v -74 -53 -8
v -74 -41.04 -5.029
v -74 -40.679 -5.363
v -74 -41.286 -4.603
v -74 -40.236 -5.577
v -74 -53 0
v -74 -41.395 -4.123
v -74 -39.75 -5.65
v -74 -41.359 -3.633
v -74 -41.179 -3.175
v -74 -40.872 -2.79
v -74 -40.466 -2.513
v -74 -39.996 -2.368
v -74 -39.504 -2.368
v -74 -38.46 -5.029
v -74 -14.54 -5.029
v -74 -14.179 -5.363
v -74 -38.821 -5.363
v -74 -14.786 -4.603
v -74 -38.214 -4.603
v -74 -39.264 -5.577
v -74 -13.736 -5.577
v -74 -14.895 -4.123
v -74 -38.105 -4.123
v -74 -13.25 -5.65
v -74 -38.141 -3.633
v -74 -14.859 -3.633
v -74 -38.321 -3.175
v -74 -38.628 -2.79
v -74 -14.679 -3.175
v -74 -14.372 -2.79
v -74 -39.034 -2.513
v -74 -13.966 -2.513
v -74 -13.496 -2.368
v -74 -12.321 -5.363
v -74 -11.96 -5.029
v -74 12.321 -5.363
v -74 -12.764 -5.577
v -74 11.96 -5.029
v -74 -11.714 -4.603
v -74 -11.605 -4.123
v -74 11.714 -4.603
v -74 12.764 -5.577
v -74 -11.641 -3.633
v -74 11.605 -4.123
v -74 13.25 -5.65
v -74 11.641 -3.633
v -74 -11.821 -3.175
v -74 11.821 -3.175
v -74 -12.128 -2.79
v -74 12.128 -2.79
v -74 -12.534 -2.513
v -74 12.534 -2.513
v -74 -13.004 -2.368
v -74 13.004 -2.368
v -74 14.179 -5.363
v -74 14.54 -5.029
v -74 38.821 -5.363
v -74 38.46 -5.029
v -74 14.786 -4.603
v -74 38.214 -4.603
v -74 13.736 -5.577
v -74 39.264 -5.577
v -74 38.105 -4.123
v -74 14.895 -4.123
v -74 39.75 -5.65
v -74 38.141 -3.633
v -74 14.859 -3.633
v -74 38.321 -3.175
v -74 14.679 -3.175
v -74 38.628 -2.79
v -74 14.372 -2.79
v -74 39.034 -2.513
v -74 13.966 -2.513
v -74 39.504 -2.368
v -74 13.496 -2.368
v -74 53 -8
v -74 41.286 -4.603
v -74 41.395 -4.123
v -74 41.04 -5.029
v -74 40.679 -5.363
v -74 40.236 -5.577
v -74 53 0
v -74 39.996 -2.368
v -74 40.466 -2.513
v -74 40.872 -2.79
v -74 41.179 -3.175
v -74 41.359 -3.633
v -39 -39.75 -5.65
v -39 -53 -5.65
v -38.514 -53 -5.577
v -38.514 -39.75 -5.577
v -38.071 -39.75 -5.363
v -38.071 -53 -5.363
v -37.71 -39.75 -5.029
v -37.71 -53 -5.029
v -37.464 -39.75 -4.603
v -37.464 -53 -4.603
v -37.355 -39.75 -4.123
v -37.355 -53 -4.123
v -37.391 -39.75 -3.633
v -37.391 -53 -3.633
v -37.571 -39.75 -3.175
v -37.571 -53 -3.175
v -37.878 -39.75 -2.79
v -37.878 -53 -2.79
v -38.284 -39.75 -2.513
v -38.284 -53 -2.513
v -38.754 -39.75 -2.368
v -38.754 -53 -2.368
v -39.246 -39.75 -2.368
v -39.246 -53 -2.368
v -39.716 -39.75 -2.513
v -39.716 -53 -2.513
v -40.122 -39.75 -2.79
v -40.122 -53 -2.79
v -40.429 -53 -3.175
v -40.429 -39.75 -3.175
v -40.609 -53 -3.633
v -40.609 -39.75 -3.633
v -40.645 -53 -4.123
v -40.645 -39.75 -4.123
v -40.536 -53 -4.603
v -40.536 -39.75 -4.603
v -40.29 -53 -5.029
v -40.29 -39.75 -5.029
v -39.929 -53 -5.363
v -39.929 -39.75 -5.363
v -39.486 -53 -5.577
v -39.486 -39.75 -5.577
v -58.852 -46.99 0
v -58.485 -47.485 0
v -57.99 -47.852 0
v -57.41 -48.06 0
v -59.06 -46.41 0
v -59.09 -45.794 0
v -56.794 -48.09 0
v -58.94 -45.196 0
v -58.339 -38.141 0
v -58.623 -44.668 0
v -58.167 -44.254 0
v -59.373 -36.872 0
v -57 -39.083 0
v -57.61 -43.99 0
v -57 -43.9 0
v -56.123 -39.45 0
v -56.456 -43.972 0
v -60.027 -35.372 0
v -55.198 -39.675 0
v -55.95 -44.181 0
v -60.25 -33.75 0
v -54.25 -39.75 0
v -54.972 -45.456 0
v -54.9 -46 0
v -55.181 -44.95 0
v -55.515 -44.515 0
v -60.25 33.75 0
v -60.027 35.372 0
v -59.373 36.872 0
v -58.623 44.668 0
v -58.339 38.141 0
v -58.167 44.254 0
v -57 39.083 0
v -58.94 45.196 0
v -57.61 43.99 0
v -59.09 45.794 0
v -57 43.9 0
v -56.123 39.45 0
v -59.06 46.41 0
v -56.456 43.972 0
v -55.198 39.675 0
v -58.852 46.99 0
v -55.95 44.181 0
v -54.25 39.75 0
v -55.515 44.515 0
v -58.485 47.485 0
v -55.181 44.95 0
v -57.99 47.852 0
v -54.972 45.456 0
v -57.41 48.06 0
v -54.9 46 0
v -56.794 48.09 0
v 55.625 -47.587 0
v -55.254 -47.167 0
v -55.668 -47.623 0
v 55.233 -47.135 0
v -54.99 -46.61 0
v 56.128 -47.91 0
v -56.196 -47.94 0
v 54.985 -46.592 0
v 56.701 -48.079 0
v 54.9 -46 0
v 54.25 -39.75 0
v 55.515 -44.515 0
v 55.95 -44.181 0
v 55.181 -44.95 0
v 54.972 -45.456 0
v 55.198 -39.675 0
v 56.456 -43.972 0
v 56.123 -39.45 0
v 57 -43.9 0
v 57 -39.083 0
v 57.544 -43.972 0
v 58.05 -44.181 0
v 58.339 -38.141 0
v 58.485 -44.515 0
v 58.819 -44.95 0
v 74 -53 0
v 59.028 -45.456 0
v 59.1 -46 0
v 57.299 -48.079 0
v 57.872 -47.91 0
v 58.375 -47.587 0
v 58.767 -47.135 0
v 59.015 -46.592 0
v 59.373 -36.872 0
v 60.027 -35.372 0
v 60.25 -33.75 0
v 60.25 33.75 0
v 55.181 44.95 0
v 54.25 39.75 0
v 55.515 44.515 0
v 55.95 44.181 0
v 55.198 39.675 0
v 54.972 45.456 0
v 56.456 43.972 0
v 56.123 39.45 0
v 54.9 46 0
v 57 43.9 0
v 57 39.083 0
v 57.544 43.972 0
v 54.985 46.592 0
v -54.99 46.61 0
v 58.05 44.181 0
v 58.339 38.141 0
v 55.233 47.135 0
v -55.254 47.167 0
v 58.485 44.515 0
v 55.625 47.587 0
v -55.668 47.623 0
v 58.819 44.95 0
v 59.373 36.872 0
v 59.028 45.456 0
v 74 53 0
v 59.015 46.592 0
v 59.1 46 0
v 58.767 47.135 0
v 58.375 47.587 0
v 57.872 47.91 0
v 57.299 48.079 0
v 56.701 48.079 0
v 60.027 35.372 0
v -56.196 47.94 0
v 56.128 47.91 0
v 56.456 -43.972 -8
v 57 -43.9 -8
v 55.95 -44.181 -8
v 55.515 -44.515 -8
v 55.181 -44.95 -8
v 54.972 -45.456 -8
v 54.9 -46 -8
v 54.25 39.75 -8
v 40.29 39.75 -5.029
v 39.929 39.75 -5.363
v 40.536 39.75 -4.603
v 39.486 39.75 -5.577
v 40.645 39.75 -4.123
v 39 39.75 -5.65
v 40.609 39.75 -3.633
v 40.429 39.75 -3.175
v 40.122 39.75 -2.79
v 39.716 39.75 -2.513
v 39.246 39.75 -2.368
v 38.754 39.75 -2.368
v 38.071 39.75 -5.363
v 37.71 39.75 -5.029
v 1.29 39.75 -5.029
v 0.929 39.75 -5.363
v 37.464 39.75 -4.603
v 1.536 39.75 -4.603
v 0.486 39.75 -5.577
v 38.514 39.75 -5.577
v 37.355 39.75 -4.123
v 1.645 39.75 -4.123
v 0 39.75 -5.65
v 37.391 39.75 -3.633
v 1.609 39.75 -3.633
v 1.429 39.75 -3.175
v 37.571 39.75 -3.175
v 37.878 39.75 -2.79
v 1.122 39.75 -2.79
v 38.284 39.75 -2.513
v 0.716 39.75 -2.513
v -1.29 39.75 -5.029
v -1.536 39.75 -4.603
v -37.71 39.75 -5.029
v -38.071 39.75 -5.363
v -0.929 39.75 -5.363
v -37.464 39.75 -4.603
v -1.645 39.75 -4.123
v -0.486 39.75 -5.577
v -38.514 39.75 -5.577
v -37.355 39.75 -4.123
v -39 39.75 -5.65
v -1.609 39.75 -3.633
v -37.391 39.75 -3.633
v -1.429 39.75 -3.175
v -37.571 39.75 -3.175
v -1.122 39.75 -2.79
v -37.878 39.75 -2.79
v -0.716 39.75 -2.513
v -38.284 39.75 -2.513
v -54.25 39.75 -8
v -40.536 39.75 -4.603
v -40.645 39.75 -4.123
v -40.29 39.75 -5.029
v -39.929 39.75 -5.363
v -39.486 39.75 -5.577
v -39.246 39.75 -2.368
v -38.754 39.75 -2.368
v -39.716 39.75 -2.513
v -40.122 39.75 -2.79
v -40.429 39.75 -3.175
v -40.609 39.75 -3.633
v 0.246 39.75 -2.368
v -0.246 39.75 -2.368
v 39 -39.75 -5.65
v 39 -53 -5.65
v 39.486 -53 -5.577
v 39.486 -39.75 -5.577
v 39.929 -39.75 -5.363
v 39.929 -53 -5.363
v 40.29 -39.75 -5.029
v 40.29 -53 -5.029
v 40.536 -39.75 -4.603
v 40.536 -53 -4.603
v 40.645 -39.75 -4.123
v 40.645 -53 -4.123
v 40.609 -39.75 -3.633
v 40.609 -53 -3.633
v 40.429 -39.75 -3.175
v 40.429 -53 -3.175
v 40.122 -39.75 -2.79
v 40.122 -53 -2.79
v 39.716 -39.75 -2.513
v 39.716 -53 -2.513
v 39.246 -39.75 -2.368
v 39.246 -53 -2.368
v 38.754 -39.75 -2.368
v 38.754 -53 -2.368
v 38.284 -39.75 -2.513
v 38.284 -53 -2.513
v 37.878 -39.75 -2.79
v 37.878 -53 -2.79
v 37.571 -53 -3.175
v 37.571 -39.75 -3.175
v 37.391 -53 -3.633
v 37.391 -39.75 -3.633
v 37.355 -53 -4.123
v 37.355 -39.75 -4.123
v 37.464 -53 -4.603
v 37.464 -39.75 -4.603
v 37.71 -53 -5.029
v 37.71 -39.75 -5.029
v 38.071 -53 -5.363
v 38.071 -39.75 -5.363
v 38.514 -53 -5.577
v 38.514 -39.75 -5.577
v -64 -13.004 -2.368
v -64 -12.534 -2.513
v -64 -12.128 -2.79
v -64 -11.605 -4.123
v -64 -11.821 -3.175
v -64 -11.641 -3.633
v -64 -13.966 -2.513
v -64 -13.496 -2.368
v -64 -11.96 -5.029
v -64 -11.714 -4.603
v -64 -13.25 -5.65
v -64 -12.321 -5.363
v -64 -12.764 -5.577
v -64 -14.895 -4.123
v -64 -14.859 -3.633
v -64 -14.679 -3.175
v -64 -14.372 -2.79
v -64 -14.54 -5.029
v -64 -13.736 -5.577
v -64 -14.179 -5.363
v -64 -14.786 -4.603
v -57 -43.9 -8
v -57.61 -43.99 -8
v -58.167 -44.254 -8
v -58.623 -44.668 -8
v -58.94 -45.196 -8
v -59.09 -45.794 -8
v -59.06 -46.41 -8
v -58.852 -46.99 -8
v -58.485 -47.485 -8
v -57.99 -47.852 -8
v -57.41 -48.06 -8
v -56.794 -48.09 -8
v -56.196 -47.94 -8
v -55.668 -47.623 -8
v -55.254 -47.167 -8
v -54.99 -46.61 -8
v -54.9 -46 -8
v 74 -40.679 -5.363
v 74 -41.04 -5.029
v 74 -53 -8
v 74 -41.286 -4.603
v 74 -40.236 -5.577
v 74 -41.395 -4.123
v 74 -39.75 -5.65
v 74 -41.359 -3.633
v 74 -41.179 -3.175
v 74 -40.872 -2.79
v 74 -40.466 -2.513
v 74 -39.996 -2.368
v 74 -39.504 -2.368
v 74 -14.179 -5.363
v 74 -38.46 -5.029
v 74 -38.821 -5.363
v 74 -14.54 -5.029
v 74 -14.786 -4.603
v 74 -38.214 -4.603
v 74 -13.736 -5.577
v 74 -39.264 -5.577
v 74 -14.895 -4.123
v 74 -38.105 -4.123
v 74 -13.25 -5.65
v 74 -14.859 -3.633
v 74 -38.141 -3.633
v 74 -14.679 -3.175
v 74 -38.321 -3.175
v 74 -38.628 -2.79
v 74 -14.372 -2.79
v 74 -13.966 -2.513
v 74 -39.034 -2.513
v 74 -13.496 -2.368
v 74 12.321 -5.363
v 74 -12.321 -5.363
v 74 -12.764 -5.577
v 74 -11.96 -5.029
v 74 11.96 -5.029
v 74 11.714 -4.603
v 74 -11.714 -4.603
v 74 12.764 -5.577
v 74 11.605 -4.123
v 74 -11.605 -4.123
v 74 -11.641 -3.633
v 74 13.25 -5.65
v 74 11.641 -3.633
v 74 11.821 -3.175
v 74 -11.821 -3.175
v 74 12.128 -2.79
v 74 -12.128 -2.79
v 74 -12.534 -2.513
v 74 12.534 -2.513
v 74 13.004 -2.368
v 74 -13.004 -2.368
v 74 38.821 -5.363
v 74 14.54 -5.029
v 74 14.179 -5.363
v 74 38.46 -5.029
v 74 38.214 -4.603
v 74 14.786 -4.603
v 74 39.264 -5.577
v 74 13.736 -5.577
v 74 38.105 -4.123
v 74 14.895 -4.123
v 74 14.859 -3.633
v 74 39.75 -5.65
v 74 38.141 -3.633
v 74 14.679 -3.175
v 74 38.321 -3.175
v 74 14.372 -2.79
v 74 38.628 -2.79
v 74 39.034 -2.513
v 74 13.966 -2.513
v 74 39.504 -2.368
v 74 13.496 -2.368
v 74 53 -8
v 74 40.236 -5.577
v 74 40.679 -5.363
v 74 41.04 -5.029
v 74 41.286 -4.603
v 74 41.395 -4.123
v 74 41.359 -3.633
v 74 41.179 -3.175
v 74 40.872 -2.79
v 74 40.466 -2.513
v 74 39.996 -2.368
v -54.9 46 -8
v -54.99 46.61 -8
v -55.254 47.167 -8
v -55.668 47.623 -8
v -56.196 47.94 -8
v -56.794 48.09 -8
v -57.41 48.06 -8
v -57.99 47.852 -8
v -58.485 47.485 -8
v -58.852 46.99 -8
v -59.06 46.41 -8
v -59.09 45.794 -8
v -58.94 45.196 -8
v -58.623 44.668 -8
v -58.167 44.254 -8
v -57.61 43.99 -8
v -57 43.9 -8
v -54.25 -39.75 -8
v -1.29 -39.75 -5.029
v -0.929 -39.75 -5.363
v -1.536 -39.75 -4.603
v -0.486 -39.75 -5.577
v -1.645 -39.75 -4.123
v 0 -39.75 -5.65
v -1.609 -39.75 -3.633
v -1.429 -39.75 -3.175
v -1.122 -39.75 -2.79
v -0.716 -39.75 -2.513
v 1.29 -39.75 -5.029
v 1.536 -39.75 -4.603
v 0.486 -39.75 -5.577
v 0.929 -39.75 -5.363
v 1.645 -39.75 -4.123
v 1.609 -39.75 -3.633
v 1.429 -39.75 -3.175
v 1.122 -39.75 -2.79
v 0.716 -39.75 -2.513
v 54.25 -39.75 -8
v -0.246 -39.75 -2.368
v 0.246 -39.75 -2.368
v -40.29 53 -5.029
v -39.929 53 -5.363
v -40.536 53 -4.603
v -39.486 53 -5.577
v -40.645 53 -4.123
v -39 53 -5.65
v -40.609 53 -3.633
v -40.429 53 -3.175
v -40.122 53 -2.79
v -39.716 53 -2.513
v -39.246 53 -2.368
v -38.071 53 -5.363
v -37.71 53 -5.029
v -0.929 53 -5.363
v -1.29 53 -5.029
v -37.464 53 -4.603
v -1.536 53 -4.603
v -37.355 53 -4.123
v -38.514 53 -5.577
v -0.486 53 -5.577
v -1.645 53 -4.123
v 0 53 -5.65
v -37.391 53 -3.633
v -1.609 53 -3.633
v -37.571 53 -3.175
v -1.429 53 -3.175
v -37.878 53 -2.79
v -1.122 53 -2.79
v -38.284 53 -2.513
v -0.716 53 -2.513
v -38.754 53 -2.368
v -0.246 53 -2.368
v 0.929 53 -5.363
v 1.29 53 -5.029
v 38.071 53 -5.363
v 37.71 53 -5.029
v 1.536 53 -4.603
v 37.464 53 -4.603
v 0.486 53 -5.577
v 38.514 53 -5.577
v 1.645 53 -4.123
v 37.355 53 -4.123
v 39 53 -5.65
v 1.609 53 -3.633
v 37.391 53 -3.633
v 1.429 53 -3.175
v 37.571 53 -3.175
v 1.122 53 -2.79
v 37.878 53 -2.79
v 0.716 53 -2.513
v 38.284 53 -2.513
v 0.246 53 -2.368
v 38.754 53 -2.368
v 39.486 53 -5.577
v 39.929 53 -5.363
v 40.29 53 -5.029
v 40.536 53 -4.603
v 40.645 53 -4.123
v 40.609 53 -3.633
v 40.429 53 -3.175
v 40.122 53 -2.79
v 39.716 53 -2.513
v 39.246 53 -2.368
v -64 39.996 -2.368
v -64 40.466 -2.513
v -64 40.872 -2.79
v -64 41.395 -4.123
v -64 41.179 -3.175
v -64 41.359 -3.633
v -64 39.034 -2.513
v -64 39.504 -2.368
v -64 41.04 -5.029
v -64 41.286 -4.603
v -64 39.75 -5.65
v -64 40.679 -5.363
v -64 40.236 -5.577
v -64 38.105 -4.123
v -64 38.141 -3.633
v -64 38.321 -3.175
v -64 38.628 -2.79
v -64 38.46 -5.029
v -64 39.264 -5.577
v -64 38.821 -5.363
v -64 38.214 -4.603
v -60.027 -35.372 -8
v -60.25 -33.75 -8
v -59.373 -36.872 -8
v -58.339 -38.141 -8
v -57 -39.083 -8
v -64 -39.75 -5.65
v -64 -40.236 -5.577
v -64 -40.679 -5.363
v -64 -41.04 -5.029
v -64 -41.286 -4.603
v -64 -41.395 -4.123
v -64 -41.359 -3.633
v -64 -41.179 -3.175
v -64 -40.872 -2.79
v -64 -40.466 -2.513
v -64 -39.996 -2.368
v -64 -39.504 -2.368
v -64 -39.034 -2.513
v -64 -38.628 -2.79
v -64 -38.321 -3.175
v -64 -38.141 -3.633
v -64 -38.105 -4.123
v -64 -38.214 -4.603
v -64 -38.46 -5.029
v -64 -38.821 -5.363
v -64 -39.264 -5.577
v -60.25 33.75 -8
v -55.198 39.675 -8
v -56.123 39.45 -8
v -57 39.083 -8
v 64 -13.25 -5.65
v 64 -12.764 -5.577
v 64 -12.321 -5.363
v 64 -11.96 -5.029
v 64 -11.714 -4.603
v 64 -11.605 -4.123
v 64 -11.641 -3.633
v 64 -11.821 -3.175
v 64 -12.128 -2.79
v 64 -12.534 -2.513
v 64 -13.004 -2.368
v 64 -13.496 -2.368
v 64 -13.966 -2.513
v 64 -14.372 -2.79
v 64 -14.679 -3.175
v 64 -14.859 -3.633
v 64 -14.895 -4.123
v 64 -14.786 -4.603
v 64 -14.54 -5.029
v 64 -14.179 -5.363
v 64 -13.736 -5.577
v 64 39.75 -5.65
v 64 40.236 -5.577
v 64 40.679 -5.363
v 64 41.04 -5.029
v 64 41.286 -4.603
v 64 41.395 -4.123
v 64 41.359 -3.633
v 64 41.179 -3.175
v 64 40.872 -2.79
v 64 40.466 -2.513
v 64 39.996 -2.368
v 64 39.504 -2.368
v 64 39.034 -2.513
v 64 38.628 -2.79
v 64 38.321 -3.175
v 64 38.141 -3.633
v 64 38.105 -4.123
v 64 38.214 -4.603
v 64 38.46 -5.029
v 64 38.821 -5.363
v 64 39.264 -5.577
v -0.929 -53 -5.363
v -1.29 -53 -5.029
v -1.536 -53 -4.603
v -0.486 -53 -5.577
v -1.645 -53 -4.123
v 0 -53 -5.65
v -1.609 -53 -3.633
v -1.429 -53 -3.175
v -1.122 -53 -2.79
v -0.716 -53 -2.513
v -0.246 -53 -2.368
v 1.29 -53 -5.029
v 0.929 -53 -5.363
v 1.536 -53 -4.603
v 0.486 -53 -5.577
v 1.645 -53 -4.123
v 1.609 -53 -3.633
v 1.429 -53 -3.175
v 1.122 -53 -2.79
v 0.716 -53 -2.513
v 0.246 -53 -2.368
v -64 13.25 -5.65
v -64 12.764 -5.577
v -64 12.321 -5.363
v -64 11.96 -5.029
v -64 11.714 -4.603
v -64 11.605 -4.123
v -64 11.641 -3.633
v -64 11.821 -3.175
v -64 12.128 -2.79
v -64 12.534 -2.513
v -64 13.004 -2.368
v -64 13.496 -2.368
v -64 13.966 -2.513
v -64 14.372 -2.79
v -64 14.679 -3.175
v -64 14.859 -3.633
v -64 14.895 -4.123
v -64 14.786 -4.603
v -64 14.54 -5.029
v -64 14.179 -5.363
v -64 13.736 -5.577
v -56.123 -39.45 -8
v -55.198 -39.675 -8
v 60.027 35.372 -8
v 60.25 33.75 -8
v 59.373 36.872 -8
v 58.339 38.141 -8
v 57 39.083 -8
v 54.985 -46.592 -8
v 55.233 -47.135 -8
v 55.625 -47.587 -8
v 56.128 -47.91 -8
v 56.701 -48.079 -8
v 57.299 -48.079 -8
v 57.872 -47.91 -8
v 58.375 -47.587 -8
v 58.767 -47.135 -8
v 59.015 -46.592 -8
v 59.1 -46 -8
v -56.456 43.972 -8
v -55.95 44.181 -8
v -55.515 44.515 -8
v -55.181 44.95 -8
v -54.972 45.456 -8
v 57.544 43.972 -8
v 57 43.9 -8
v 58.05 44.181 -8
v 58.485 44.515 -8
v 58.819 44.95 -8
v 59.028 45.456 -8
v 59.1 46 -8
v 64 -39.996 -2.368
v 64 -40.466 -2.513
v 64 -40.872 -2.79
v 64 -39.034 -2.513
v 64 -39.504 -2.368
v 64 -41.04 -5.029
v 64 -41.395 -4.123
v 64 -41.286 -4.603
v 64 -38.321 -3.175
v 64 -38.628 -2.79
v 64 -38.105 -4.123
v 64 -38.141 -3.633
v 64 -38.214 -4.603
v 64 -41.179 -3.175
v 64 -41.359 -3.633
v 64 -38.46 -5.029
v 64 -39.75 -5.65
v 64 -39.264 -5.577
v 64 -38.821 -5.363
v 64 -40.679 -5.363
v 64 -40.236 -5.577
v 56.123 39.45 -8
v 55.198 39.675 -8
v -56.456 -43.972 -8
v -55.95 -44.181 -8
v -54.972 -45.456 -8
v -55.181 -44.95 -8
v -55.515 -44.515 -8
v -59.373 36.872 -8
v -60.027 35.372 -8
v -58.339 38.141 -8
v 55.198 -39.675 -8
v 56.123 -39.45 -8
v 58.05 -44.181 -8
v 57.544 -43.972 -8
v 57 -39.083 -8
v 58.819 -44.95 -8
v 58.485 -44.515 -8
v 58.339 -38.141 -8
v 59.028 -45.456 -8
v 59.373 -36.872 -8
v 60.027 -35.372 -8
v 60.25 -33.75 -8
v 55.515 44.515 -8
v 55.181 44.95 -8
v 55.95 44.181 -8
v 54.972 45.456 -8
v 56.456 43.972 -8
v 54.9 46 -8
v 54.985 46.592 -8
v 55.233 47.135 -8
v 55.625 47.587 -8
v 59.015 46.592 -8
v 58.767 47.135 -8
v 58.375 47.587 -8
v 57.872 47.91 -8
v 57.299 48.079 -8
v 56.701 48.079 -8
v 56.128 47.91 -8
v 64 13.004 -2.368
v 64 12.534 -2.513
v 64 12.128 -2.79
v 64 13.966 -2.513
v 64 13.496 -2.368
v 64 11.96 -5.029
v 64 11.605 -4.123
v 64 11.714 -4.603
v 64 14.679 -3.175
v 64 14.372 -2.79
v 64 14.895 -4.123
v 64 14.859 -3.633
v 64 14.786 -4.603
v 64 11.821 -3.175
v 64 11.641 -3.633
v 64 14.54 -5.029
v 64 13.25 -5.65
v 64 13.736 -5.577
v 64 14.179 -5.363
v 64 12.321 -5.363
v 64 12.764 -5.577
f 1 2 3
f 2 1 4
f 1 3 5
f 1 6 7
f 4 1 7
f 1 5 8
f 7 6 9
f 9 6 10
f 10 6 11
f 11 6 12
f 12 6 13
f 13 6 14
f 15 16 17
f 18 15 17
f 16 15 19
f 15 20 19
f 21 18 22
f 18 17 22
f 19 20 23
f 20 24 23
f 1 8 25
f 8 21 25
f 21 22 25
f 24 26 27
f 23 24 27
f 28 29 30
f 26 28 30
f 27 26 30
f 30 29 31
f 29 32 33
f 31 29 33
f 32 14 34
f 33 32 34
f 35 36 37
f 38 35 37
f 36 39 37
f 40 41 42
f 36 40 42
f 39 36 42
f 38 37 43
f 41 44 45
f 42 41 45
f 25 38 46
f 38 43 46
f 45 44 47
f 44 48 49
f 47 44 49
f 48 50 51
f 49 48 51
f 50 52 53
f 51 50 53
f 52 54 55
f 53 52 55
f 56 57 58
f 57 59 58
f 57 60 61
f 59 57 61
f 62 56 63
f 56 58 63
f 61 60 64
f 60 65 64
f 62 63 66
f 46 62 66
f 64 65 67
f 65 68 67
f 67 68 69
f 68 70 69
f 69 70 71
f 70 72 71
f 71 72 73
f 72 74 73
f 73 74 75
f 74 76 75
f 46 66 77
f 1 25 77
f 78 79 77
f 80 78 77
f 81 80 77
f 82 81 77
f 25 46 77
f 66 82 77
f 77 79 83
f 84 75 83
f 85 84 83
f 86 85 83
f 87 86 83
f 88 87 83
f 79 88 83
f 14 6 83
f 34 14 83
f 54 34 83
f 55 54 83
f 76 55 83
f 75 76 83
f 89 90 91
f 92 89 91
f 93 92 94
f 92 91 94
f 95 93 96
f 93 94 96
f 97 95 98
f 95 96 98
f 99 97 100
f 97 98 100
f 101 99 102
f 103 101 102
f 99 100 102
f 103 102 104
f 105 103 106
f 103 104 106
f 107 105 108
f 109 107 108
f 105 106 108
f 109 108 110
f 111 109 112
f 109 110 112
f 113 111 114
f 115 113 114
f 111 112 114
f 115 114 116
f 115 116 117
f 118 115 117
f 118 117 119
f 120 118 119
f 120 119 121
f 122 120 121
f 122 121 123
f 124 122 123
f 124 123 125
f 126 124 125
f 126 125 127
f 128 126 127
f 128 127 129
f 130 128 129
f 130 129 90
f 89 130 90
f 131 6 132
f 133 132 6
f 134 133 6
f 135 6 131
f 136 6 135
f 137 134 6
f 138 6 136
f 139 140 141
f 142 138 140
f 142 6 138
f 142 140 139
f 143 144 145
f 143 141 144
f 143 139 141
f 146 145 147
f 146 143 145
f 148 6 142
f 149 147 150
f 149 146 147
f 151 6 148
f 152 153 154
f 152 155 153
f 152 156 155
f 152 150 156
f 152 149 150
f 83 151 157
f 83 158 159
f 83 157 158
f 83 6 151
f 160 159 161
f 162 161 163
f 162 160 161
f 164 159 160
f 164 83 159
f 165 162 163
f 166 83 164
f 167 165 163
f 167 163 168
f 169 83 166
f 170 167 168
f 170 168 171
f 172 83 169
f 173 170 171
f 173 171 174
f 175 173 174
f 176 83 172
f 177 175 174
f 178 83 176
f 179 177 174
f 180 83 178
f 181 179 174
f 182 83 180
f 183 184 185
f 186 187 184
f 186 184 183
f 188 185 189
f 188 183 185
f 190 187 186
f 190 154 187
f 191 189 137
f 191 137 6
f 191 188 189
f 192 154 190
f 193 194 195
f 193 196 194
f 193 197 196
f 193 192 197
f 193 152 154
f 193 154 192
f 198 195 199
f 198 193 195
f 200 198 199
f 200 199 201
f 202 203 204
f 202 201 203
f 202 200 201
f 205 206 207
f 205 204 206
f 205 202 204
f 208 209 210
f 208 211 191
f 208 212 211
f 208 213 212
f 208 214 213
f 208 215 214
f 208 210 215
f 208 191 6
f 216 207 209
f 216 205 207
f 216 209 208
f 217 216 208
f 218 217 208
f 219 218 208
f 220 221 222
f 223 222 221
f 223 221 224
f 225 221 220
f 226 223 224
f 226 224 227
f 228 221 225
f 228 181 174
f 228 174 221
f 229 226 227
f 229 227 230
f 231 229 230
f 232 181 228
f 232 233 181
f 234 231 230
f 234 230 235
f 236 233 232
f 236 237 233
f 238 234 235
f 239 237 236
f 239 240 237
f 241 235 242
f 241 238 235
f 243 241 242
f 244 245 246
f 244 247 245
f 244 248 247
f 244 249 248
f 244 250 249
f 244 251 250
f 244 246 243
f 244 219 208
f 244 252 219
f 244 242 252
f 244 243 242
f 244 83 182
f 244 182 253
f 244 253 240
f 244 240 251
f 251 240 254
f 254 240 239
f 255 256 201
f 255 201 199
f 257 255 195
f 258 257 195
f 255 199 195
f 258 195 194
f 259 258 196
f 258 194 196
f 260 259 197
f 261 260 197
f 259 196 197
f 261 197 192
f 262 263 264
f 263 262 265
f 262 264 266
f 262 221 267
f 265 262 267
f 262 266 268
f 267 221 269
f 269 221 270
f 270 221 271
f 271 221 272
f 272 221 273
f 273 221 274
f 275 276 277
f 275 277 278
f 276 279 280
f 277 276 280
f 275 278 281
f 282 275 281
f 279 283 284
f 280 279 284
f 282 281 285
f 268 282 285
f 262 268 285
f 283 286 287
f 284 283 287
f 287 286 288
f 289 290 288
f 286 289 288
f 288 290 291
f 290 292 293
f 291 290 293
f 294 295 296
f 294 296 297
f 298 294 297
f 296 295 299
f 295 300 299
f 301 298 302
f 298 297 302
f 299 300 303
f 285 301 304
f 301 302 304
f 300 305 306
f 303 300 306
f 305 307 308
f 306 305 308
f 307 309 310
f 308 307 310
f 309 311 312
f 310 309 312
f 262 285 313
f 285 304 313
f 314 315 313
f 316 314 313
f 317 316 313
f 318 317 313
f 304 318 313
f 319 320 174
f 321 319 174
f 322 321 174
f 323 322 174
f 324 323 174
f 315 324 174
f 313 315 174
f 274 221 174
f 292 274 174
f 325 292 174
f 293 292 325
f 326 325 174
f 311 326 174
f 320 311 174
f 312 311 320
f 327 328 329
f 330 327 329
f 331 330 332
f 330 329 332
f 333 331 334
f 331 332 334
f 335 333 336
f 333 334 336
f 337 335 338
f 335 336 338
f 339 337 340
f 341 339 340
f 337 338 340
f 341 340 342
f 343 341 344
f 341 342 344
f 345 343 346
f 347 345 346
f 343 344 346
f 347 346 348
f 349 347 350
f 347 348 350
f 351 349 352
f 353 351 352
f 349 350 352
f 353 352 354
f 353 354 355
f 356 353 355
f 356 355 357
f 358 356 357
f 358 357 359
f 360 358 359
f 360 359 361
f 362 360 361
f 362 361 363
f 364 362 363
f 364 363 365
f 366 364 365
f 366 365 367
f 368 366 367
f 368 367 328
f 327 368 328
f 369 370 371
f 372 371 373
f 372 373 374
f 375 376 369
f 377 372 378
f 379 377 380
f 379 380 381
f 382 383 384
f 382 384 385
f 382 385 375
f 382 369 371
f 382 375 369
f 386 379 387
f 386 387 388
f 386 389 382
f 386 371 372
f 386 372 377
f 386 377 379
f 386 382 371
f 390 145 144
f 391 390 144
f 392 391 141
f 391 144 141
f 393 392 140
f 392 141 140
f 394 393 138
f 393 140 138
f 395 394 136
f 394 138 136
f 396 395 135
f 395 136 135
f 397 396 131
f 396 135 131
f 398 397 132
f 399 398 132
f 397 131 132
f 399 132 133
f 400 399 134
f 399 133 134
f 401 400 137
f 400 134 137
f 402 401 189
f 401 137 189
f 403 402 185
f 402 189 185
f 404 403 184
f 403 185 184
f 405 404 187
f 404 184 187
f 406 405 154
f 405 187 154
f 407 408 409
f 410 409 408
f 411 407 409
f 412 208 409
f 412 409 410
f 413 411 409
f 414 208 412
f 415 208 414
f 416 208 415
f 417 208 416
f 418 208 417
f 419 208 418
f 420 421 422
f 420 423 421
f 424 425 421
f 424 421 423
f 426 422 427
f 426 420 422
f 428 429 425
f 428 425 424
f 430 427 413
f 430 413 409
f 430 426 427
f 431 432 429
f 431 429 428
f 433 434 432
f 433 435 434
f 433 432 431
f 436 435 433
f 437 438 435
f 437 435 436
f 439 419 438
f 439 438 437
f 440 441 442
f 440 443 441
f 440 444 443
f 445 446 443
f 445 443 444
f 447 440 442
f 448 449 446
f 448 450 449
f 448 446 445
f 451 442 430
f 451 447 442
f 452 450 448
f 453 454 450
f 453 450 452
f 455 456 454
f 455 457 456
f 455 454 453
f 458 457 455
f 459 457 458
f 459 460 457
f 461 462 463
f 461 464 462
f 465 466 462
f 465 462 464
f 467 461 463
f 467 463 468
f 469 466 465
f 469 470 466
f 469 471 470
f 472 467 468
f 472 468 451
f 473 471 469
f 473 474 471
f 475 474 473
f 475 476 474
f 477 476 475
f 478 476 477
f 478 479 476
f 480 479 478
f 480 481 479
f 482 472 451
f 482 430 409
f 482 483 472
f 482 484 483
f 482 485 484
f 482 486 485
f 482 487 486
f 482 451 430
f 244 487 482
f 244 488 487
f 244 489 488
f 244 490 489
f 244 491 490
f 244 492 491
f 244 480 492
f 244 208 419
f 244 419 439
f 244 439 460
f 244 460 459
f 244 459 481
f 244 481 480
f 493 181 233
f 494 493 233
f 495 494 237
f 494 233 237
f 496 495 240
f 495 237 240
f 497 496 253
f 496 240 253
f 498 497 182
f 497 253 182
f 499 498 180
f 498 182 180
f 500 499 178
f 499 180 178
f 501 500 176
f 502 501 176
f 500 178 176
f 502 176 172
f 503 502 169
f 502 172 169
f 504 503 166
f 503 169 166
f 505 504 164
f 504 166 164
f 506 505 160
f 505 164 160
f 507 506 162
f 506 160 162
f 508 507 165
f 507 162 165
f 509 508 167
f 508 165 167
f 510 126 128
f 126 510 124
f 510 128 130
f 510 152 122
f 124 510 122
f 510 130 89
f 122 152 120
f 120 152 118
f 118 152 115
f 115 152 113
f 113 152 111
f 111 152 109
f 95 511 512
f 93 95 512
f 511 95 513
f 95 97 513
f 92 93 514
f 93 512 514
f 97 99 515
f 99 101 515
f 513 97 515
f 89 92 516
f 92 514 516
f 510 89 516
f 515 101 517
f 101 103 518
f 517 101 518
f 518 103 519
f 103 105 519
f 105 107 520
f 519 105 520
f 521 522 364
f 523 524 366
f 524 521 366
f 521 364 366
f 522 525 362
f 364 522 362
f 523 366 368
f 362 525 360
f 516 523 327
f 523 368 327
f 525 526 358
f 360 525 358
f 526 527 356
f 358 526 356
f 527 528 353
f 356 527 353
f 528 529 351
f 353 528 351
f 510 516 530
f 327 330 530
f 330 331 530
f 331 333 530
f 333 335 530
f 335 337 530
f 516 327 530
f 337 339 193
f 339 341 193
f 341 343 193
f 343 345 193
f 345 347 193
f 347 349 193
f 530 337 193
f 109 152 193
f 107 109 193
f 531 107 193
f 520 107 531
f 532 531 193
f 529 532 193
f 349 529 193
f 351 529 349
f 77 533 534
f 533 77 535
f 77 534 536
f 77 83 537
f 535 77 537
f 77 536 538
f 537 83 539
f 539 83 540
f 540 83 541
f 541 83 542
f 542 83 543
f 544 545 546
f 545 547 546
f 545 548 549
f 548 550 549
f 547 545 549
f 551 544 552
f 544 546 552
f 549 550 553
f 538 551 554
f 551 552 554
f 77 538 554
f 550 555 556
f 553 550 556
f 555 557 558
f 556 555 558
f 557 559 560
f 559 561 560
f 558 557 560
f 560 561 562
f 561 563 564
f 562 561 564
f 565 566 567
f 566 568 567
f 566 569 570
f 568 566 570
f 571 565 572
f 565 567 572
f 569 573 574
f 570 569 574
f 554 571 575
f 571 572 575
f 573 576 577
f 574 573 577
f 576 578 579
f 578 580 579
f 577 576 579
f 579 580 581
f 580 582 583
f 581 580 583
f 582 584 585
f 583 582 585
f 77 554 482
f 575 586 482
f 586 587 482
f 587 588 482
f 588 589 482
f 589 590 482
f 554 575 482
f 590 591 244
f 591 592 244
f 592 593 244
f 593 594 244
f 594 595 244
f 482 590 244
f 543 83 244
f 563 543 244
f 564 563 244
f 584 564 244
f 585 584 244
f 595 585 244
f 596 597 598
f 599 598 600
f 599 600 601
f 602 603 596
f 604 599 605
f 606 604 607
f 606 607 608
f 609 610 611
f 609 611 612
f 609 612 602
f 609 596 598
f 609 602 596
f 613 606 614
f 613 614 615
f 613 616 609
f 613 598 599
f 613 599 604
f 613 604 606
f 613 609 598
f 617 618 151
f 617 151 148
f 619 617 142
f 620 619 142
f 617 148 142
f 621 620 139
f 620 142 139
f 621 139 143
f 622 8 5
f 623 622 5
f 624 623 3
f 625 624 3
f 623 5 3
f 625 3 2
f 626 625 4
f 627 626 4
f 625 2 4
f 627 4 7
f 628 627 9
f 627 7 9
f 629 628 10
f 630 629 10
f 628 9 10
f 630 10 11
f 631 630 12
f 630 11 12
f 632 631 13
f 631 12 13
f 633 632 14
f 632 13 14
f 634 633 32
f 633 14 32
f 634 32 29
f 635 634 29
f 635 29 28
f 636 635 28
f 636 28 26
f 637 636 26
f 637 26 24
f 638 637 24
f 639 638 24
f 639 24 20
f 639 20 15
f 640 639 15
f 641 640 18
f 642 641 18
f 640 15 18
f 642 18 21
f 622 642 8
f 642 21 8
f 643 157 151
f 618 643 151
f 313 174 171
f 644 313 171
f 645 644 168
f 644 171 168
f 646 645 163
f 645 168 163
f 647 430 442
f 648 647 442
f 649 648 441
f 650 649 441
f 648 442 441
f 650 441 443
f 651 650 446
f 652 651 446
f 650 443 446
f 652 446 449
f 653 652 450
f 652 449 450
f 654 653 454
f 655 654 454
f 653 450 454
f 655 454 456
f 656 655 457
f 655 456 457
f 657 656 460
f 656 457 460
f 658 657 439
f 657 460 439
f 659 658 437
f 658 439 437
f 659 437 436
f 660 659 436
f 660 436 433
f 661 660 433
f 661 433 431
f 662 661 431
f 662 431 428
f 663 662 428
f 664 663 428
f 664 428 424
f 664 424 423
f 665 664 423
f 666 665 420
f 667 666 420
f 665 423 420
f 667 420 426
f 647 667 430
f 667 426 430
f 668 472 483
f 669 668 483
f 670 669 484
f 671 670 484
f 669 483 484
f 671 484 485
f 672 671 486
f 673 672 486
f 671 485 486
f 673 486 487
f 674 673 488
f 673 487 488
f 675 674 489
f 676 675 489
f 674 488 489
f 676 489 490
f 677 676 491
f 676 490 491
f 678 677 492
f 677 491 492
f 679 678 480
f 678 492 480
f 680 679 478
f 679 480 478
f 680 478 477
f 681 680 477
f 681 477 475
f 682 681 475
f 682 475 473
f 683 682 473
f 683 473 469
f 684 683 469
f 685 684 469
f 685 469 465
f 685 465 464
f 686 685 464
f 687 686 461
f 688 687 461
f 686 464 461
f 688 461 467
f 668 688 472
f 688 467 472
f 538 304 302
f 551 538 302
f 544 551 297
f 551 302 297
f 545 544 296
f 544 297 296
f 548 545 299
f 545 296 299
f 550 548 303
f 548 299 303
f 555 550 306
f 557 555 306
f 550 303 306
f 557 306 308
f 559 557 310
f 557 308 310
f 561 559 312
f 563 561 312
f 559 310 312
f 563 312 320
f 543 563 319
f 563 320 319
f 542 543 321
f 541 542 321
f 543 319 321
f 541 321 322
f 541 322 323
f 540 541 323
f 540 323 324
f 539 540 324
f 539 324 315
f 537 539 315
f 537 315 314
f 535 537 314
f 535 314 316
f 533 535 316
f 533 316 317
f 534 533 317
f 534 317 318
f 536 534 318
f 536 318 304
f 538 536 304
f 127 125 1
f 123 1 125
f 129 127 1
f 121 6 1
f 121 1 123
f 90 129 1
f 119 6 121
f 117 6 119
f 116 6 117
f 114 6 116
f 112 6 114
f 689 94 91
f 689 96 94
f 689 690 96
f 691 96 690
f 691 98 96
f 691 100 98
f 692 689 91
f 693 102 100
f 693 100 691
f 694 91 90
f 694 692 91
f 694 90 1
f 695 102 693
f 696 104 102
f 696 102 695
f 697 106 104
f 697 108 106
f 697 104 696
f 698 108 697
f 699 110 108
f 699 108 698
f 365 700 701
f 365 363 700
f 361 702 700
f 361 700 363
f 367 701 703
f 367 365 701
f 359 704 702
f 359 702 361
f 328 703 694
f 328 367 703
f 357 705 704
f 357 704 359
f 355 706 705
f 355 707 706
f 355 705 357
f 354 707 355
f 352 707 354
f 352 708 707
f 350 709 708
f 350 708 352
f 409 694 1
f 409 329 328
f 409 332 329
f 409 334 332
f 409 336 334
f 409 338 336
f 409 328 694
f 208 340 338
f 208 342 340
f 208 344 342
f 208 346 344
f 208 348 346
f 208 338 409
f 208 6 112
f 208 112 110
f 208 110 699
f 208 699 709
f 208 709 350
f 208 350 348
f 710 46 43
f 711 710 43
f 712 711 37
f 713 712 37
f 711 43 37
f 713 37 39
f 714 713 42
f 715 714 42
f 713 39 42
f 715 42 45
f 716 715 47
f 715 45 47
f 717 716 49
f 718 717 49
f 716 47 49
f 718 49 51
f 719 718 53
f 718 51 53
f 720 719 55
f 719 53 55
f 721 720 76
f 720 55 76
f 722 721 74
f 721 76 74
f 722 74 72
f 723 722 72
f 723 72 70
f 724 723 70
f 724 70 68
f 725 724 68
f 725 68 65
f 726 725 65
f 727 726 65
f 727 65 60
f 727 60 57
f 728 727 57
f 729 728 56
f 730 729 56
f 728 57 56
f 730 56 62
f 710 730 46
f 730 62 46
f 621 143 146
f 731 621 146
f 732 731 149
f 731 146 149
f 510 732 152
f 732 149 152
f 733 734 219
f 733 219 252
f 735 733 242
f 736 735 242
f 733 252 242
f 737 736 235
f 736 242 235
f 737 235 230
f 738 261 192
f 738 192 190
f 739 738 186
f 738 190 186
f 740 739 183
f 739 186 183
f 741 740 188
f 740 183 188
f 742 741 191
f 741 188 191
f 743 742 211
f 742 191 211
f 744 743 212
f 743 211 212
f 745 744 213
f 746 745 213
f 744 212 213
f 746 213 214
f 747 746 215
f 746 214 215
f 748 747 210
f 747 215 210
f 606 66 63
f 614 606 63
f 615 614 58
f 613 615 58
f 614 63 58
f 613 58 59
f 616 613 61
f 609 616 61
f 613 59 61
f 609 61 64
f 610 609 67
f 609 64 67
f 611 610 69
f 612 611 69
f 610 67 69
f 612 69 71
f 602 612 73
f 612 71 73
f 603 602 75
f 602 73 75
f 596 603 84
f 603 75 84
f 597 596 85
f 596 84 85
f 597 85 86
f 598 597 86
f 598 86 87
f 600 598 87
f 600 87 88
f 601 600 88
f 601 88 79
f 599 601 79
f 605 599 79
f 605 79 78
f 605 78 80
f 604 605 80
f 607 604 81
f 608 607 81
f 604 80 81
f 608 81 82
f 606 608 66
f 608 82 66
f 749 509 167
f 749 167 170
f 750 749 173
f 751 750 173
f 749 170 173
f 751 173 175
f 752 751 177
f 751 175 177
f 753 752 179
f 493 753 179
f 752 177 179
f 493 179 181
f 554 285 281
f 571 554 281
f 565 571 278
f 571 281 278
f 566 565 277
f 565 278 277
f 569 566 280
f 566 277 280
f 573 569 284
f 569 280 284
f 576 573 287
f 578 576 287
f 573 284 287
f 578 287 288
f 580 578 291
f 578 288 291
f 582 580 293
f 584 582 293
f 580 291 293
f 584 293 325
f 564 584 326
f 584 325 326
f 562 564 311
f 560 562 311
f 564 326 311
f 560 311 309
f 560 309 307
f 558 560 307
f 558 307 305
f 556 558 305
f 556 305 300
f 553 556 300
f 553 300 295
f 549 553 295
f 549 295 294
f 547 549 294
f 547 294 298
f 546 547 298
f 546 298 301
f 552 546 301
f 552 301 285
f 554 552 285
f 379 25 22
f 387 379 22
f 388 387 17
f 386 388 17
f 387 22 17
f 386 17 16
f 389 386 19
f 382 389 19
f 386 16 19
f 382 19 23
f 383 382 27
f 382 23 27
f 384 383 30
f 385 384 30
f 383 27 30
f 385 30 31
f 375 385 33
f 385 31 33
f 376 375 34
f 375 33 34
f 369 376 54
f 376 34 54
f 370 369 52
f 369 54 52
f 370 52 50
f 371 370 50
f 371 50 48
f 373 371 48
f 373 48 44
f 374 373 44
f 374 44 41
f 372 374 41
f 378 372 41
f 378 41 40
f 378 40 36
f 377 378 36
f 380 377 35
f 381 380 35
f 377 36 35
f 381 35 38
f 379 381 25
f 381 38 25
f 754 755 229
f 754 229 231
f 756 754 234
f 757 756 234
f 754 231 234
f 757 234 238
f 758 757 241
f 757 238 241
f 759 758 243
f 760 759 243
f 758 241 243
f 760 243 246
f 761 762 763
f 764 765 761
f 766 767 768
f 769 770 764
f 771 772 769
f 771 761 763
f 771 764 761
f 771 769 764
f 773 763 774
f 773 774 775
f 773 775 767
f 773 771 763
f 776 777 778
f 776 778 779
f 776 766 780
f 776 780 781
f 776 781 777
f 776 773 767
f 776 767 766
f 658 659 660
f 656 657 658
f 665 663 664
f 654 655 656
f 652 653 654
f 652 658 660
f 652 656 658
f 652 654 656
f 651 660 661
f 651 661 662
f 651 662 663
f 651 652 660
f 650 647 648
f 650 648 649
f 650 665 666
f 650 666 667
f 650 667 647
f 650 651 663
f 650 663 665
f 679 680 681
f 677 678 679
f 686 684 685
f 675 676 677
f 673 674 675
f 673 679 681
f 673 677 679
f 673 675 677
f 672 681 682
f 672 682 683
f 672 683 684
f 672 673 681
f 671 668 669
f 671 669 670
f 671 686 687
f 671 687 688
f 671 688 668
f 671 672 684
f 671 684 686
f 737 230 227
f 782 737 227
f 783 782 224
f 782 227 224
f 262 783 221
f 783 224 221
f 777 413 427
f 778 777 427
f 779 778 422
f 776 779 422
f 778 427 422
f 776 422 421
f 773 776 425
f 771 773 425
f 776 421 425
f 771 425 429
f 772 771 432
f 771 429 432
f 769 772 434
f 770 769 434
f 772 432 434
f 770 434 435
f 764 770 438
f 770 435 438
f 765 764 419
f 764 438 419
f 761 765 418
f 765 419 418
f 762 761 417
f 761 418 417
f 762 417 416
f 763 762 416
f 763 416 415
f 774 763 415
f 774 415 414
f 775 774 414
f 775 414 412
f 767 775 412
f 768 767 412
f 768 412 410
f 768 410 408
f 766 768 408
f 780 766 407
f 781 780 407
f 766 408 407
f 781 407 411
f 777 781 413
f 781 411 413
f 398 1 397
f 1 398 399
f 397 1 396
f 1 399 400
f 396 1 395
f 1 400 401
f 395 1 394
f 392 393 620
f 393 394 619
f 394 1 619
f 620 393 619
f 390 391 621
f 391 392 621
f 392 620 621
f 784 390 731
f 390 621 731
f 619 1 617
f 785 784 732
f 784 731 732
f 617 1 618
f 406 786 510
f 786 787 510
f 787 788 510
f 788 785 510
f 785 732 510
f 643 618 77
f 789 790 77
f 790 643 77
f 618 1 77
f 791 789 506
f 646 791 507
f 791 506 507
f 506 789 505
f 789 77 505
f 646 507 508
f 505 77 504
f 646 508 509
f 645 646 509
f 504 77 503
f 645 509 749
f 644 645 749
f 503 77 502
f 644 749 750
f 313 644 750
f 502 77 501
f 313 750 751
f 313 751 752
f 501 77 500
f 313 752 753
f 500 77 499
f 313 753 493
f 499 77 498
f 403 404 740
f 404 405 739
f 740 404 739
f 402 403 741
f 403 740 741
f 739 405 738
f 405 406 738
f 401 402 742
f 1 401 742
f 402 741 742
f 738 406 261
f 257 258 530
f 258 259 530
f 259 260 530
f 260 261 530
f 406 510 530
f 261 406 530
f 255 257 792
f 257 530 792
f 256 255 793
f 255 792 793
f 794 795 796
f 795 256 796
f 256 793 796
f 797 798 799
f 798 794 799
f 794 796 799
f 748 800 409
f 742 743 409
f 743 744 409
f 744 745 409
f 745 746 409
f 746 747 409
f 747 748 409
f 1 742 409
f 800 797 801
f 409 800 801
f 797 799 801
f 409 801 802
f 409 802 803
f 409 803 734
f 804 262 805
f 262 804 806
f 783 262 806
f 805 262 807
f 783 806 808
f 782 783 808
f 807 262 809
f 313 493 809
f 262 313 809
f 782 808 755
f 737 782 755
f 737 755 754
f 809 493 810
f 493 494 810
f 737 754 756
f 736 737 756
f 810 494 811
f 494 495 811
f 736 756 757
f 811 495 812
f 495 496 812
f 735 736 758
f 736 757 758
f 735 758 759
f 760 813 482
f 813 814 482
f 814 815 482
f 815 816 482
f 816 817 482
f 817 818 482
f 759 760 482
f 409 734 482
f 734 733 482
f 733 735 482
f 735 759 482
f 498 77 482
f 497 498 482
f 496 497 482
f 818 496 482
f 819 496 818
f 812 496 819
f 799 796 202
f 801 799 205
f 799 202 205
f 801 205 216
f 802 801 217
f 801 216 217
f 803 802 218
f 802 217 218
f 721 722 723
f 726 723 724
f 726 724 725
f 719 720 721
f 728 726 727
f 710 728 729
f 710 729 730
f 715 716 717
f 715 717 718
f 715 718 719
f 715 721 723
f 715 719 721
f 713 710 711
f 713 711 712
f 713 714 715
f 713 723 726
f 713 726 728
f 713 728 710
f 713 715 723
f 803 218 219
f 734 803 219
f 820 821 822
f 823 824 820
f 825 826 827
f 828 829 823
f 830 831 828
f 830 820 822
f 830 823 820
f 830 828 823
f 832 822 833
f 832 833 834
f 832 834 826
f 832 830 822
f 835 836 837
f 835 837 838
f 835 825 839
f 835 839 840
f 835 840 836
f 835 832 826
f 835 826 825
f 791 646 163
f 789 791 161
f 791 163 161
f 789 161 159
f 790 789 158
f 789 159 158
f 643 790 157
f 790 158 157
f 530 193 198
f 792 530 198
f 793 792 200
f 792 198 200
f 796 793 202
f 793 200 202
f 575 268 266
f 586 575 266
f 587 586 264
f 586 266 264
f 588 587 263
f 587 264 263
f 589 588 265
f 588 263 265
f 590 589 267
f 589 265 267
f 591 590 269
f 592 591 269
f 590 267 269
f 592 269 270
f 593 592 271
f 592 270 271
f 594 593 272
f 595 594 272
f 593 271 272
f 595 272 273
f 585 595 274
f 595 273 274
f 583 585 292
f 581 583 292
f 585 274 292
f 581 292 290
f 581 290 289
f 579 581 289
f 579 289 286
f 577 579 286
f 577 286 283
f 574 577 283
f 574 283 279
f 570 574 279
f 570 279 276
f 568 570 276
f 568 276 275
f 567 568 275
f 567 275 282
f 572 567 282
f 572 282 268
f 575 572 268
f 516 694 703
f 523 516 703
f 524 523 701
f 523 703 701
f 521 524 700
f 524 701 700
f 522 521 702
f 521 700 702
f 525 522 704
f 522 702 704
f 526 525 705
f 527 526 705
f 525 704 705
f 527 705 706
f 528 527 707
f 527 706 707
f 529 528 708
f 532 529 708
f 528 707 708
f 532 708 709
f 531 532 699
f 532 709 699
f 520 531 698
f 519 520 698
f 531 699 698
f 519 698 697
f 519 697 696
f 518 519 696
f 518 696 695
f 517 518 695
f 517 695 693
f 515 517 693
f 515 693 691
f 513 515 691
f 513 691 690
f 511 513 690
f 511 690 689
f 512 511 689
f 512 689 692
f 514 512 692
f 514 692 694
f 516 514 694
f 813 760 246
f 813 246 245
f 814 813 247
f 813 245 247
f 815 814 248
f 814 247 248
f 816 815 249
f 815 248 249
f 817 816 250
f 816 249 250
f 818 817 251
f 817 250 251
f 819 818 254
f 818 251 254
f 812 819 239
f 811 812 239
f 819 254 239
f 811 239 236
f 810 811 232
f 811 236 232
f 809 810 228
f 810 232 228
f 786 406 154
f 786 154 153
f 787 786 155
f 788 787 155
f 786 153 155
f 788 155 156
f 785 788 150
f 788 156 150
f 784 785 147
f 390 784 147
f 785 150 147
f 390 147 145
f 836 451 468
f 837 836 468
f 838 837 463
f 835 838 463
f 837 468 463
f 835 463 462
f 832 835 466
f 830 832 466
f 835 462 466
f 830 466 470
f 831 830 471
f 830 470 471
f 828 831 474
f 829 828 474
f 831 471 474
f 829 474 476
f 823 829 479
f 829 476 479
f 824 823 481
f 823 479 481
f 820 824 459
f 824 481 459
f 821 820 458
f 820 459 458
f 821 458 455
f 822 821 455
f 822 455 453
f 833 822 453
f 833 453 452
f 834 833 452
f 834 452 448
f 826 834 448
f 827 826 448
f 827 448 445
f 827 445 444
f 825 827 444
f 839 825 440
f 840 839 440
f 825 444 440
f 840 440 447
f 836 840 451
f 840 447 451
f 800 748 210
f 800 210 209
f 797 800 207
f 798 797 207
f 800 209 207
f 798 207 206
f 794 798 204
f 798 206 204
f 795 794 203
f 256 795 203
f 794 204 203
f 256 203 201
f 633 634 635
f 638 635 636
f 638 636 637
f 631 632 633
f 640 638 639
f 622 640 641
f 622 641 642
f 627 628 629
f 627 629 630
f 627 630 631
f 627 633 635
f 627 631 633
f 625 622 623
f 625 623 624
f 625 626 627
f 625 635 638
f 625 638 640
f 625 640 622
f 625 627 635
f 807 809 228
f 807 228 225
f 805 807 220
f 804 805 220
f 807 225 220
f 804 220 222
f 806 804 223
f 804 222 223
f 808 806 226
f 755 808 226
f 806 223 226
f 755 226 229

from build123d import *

# Parameters (mm, degrees)
SKETCH1_W           = 148
SKETCH1_H           = 106
BOSS_EXTRUDE1_DEPTH = 8
CUT_EXTRUDE1_REACH  = 93.373
SKETCH3_R           = 1.65
CUT_EXTRUDE2_DEPTH  = 130.52219887
SKETCH5_R           = 1.65
CUT_EXTRUDE3_DEPTH  = 10
SKETCH6_R           = 1.65
CUT_EXTRUDE4_DEPTH  = 10


with BuildPart() as part:
    # Sketch1 → Boss-Extrude1 (new body)
    with BuildSketch(Plane.XY):
        Rectangle(SKETCH1_W, SKETCH1_H)
    extrude(amount=-BOSS_EXTRUDE1_DEPTH)

    # Sketch2 → Cut-Extrude1 (cut, up to next)
    with BuildSketch(Plane.XY, mode=Mode.PRIVATE) as cut_extrude1_sk1:
        with BuildLine():
            ThreePointArc((60.25, 33.75), (59.373475383, 36.872498999), (57, 39.082682252))
            Line((57, 39.082682252), (57, -39.082682252))
            ThreePointArc((57, -39.082682252), (59.373475383, -36.872498999), (60.25, -33.75))
            Line((60.25, -33.75), (60.25, 33.75))
        make_face()
    cut_extrude1_tool1 = extrude(cut_extrude1_sk1.sketch, amount=-CUT_EXTRUDE1_REACH, mode=Mode.PRIVATE) & part.part
    # Sketch2 → Cut-Extrude1 (cut, up to next)
    with BuildSketch(Plane.XY, mode=Mode.PRIVATE) as cut_extrude1_sk2:
        with BuildLine():
            ThreePointArc((-54.25, 39.75), (-55.66490397, 39.580784403), (-57, 39.082682252))
            Line((-57, 39.082682252), (-57, -39.082682252))
            ThreePointArc((-57, -39.082682252), (-55.66490397, -39.580784403), (-54.25, -39.75))
            Line((-54.25, -39.75), (54.25, -39.75))
            ThreePointArc((54.25, -39.75), (55.66490397, -39.580784403), (57, -39.082682252))
            Line((57, -39.082682252), (57, 39.082682252))
            ThreePointArc((57, 39.082682252), (55.66490397, 39.580784403), (54.25, 39.75))
            Line((54.25, 39.75), (-54.25, 39.75))
        make_face()
    cut_extrude1_tool2 = extrude(cut_extrude1_sk2.sketch, amount=-CUT_EXTRUDE1_REACH, mode=Mode.PRIVATE) & part.part
    # Sketch2 → Cut-Extrude1 (cut, up to next)
    with BuildSketch(Plane.XY, mode=Mode.PRIVATE) as cut_extrude1_sk3:
        with BuildLine():
            Line((-57, -39.082682252), (-57, 39.082682252))
            ThreePointArc((-57, 39.082682252), (-59.373475383, 36.872498999), (-60.25, 33.75))
            Line((-60.25, 33.75), (-60.25, -33.75))
            ThreePointArc((-60.25, -33.75), (-59.373475383, -36.872498999), (-57, -39.082682252))
        make_face()
    cut_extrude1_tool3 = extrude(cut_extrude1_sk3.sketch, amount=-CUT_EXTRUDE1_REACH, mode=Mode.PRIVATE) & part.part
    # Sketch2 → Cut-Extrude1 (cut, up to next)
    with BuildSketch(Plane.XY, mode=Mode.PRIVATE) as cut_extrude1_sk4:
        with BuildLine():
            ThreePointArc((59.1, 46), (57, 48.1), (54.9, 46))
            Line((54.9, 46), (57, 46))
            Line((57, 46), (57, 43.9))
            ThreePointArc((57, 43.9), (58.48492424, 44.51507576), (59.1, 46))
        make_face()
    cut_extrude1_tool4 = extrude(cut_extrude1_sk4.sketch, amount=-CUT_EXTRUDE1_REACH, mode=Mode.PRIVATE) & part.part
    # Sketch2 → Cut-Extrude1 (cut, up to next)
    with BuildSketch(Plane.XY, mode=Mode.PRIVATE) as cut_extrude1_sk5:
        with BuildLine():
            Line((57, 46), (54.9, 46))
            ThreePointArc((54.9, 46), (55.51507576, 44.51507576), (57, 43.9))
            Line((57, 43.9), (57, 46))
        make_face()
    cut_extrude1_tool5 = extrude(cut_extrude1_sk5.sketch, amount=-CUT_EXTRUDE1_REACH, mode=Mode.PRIVATE) & part.part
    # Sketch2 → Cut-Extrude1 (cut, up to next)
    with BuildSketch(Plane.XY, mode=Mode.PRIVATE) as cut_extrude1_sk6:
        with BuildLine():
            ThreePointArc((59.1, 46), (57, 48.1), (54.9, 46))
            Line((54.9, 46), (57, 46))
            Line((57, 46), (57, 43.9))
            ThreePointArc((57, 43.9), (58.48492424, 44.51507576), (59.1, 46))
        make_face()
    cut_extrude1_tool6 = extrude(cut_extrude1_sk6.sketch, amount=-CUT_EXTRUDE1_REACH, mode=Mode.PRIVATE) & part.part
    # Sketch2 → Cut-Extrude1 (cut, up to next)
    with BuildSketch(Plane.XY, mode=Mode.PRIVATE) as cut_extrude1_sk7:
        with BuildLine():
            Line((57, 46), (54.9, 46))
            ThreePointArc((54.9, 46), (55.51507576, 44.51507576), (57, 43.9))
            Line((57, 43.9), (57, 46))
        make_face()
    cut_extrude1_tool7 = extrude(cut_extrude1_sk7.sketch, amount=-CUT_EXTRUDE1_REACH, mode=Mode.PRIVATE) & part.part
    # Sketch2 → Cut-Extrude1 (cut, up to next)
    with BuildSketch(Plane.XY, mode=Mode.PRIVATE) as cut_extrude1_sk8:
        with BuildLine():
            Line((-57, 43.9), (-57, 46))
            Line((-57, 46), (-54.9, 46))
            ThreePointArc((-54.9, 46), (-58.48492424, 47.48492424), (-57, 43.9))
        make_face()
    cut_extrude1_tool8 = extrude(cut_extrude1_sk8.sketch, amount=-CUT_EXTRUDE1_REACH, mode=Mode.PRIVATE) & part.part
    # Sketch2 → Cut-Extrude1 (cut, up to next)
    with BuildSketch(Plane.XY, mode=Mode.PRIVATE) as cut_extrude1_sk9:
        with BuildLine():
            Line((-54.9, 46), (-57, 46))
            Line((-57, 46), (-57, 43.9))
            ThreePointArc((-57, 43.9), (-55.51507576, 44.51507576), (-54.9, 46))
        make_face()
    cut_extrude1_tool9 = extrude(cut_extrude1_sk9.sketch, amount=-CUT_EXTRUDE1_REACH, mode=Mode.PRIVATE) & part.part
    # Sketch2 → Cut-Extrude1 (cut, up to next)
    with BuildSketch(Plane.XY, mode=Mode.PRIVATE) as cut_extrude1_sk10:
        with BuildLine():
            Line((-57, 43.9), (-57, 46))
            Line((-57, 46), (-54.9, 46))
            ThreePointArc((-54.9, 46), (-58.48492424, 47.48492424), (-57, 43.9))
        make_face()
    cut_extrude1_tool10 = extrude(cut_extrude1_sk10.sketch, amount=-CUT_EXTRUDE1_REACH, mode=Mode.PRIVATE) & part.part
    # Sketch2 → Cut-Extrude1 (cut, up to next)
    with BuildSketch(Plane.XY, mode=Mode.PRIVATE) as cut_extrude1_sk11:
        with BuildLine():
            Line((-54.9, 46), (-57, 46))
            Line((-57, 46), (-57, 43.9))
            ThreePointArc((-57, 43.9), (-55.51507576, 44.51507576), (-54.9, 46))
        make_face()
    cut_extrude1_tool11 = extrude(cut_extrude1_sk11.sketch, amount=-CUT_EXTRUDE1_REACH, mode=Mode.PRIVATE) & part.part
    # Sketch2 → Cut-Extrude1 (cut, up to next)
    with BuildSketch(Plane.XY, mode=Mode.PRIVATE) as cut_extrude1_sk12:
        with BuildLine():
            ThreePointArc((-54.9, -46), (-55.51507576, -44.51507576), (-57, -43.9))
            Line((-57, -43.9), (-57, -46))
            Line((-57, -46), (-54.9, -46))
        make_face()
    cut_extrude1_tool12 = extrude(cut_extrude1_sk12.sketch, amount=-CUT_EXTRUDE1_REACH, mode=Mode.PRIVATE) & part.part
    # Sketch2 → Cut-Extrude1 (cut, up to next)
    with BuildSketch(Plane.XY, mode=Mode.PRIVATE) as cut_extrude1_sk13:
        with BuildLine():
            Line((-57, -46), (-57, -43.9))
            ThreePointArc((-57, -43.9), (-58.48492424, -47.48492424), (-54.9, -46))
            Line((-54.9, -46), (-57, -46))
        make_face()
    cut_extrude1_tool13 = extrude(cut_extrude1_sk13.sketch, amount=-CUT_EXTRUDE1_REACH, mode=Mode.PRIVATE) & part.part
    # Sketch2 → Cut-Extrude1 (cut, up to next)
    with BuildSketch(Plane.XY, mode=Mode.PRIVATE) as cut_extrude1_sk14:
        with BuildLine():
            ThreePointArc((-54.9, -46), (-55.51507576, -44.51507576), (-57, -43.9))
            Line((-57, -43.9), (-57, -46))
            Line((-57, -46), (-54.9, -46))
        make_face()
    cut_extrude1_tool14 = extrude(cut_extrude1_sk14.sketch, amount=-CUT_EXTRUDE1_REACH, mode=Mode.PRIVATE) & part.part
    # Sketch2 → Cut-Extrude1 (cut, up to next)
    with BuildSketch(Plane.XY, mode=Mode.PRIVATE) as cut_extrude1_sk15:
        with BuildLine():
            Line((-57, -46), (-57, -43.9))
            ThreePointArc((-57, -43.9), (-58.48492424, -47.48492424), (-54.9, -46))
            Line((-54.9, -46), (-57, -46))
        make_face()
    cut_extrude1_tool15 = extrude(cut_extrude1_sk15.sketch, amount=-CUT_EXTRUDE1_REACH, mode=Mode.PRIVATE) & part.part
    # Sketch2 → Cut-Extrude1 (cut, up to next)
    with BuildSketch(Plane.XY, mode=Mode.PRIVATE) as cut_extrude1_sk16:
        with BuildLine():
            ThreePointArc((59.1, -46), (58.48492424, -44.51507576), (57, -43.9))
            Line((57, -43.9), (57, -46))
            Line((57, -46), (54.9, -46))
            ThreePointArc((54.9, -46), (57, -48.1), (59.1, -46))
        make_face()
    cut_extrude1_tool16 = extrude(cut_extrude1_sk16.sketch, amount=-CUT_EXTRUDE1_REACH, mode=Mode.PRIVATE) & part.part
    # Sketch2 → Cut-Extrude1 (cut, up to next)
    with BuildSketch(Plane.XY, mode=Mode.PRIVATE) as cut_extrude1_sk17:
        with BuildLine():
            Line((57, -46), (57, -43.9))
            ThreePointArc((57, -43.9), (55.51507576, -44.51507576), (54.9, -46))
            Line((54.9, -46), (57, -46))
        make_face()
    cut_extrude1_tool17 = extrude(cut_extrude1_sk17.sketch, amount=-CUT_EXTRUDE1_REACH, mode=Mode.PRIVATE) & part.part
    # Sketch2 → Cut-Extrude1 (cut, up to next)
    with BuildSketch(Plane.XY, mode=Mode.PRIVATE) as cut_extrude1_sk18:
        with BuildLine():
            ThreePointArc((59.1, -46), (58.48492424, -44.51507576), (57, -43.9))
            Line((57, -43.9), (57, -46))
            Line((57, -46), (54.9, -46))
            ThreePointArc((54.9, -46), (57, -48.1), (59.1, -46))
        make_face()
    cut_extrude1_tool18 = extrude(cut_extrude1_sk18.sketch, amount=-CUT_EXTRUDE1_REACH, mode=Mode.PRIVATE) & part.part
    # Sketch2 → Cut-Extrude1 (cut, up to next)
    with BuildSketch(Plane.XY, mode=Mode.PRIVATE) as cut_extrude1_sk19:
        with BuildLine():
            Line((57, -46), (57, -43.9))
            ThreePointArc((57, -43.9), (55.51507576, -44.51507576), (54.9, -46))
            Line((54.9, -46), (57, -46))
        make_face()
    cut_extrude1_tool19 = extrude(cut_extrude1_sk19.sketch, amount=-CUT_EXTRUDE1_REACH, mode=Mode.PRIVATE) & part.part
    add(cut_extrude1_tool1.solids().sort_by_distance((58.595694, 0, 0))[0], mode=Mode.SUBTRACT)
    add(cut_extrude1_tool2.solids().sort_by_distance((0, 0, 0))[0], mode=Mode.SUBTRACT)
    add(cut_extrude1_tool3.solids().sort_by_distance((-58.595694, 0, 0))[0], mode=Mode.SUBTRACT)
    add(cut_extrude1_tool4.solids().sort_by_distance((57.297089, 46.297089, 0))[0], mode=Mode.SUBTRACT)
    add(cut_extrude1_tool5.solids().sort_by_distance((56.108732, 45.108732, 0))[0], mode=Mode.SUBTRACT)
    add(cut_extrude1_tool6.solids().sort_by_distance((57.297089, 46.297089, 0))[0], mode=Mode.SUBTRACT)
    add(cut_extrude1_tool7.solids().sort_by_distance((56.108732, 45.108732, 0))[0], mode=Mode.SUBTRACT)
    add(cut_extrude1_tool8.solids().sort_by_distance((-57.297089, 46.297089, 0))[0], mode=Mode.SUBTRACT)
    add(cut_extrude1_tool9.solids().sort_by_distance((-56.108732, 45.108732, 0))[0], mode=Mode.SUBTRACT)
    add(cut_extrude1_tool10.solids().sort_by_distance((-57.297089, 46.297089, 0))[0], mode=Mode.SUBTRACT)
    add(cut_extrude1_tool11.solids().sort_by_distance((-56.108732, 45.108732, 0))[0], mode=Mode.SUBTRACT)
    add(cut_extrude1_tool12.solids().sort_by_distance((-56.108732, -45.108732, 0))[0], mode=Mode.SUBTRACT)
    add(cut_extrude1_tool13.solids().sort_by_distance((-57.297089, -46.297089, 0))[0], mode=Mode.SUBTRACT)
    add(cut_extrude1_tool14.solids().sort_by_distance((-56.108732, -45.108732, 0))[0], mode=Mode.SUBTRACT)
    add(cut_extrude1_tool15.solids().sort_by_distance((-57.297089, -46.297089, 0))[0], mode=Mode.SUBTRACT)
    add(cut_extrude1_tool16.solids().sort_by_distance((57.297089, -46.297089, 0))[0], mode=Mode.SUBTRACT)
    add(cut_extrude1_tool17.solids().sort_by_distance((56.108732, -45.108732, 0))[0], mode=Mode.SUBTRACT)
    add(cut_extrude1_tool18.solids().sort_by_distance((57.297089, -46.297089, 0))[0], mode=Mode.SUBTRACT)
    add(cut_extrude1_tool19.solids().sort_by_distance((56.108732, -45.108732, 0))[0], mode=Mode.SUBTRACT)

    # Sketch3 → Cut-Extrude2 (cut, through all)
    with BuildSketch(Plane.XZ.offset(53)):
        with Locations(Location((-39, -4, 0), (0, 0, 270))):
            Circle(SKETCH3_R)
        with Locations(Location((0, -4, 0), (0, 0, 270))):
            Circle(SKETCH3_R)
        with Locations(Location((39, -4, 0), (0, 0, 270))):
            Circle(SKETCH3_R)
    extrude(amount=-CUT_EXTRUDE2_DEPTH, mode=Mode.SUBTRACT)

    # Sketch5 → Cut-Extrude3 (cut)
    with BuildSketch(Plane(origin=(74, 0, 0), x_dir=(0, 0, -1), z_dir=(1, 0, 0))):
        with Locations((4, 39.75)):
            Circle(SKETCH5_R)
        with Locations((4, 13.25)):
            Circle(SKETCH5_R)
        with Locations((4, -13.25)):
            Circle(SKETCH5_R)
        with Locations((4, -39.75)):
            Circle(SKETCH5_R)
    extrude(amount=-CUT_EXTRUDE3_DEPTH, mode=Mode.SUBTRACT)

    # Sketch6 → Cut-Extrude4 (cut)
    with BuildSketch(Plane.ZY.offset(74)):
        with Locations(Location((-4, 39.75, 0), (0, 0, 180))):
            Circle(SKETCH6_R)
        with Locations(Location((-4, 13.25, 0), (0, 0, 180))):
            Circle(SKETCH6_R)
        with Locations(Location((-4, -13.25, 0), (0, 0, 180))):
            Circle(SKETCH6_R)
        with Locations(Location((-4, -39.75, 0), (0, 0, 180))):
            Circle(SKETCH6_R)
    extrude(amount=-CUT_EXTRUDE4_DEPTH, mode=Mode.SUBTRACT)


solid = part.part
